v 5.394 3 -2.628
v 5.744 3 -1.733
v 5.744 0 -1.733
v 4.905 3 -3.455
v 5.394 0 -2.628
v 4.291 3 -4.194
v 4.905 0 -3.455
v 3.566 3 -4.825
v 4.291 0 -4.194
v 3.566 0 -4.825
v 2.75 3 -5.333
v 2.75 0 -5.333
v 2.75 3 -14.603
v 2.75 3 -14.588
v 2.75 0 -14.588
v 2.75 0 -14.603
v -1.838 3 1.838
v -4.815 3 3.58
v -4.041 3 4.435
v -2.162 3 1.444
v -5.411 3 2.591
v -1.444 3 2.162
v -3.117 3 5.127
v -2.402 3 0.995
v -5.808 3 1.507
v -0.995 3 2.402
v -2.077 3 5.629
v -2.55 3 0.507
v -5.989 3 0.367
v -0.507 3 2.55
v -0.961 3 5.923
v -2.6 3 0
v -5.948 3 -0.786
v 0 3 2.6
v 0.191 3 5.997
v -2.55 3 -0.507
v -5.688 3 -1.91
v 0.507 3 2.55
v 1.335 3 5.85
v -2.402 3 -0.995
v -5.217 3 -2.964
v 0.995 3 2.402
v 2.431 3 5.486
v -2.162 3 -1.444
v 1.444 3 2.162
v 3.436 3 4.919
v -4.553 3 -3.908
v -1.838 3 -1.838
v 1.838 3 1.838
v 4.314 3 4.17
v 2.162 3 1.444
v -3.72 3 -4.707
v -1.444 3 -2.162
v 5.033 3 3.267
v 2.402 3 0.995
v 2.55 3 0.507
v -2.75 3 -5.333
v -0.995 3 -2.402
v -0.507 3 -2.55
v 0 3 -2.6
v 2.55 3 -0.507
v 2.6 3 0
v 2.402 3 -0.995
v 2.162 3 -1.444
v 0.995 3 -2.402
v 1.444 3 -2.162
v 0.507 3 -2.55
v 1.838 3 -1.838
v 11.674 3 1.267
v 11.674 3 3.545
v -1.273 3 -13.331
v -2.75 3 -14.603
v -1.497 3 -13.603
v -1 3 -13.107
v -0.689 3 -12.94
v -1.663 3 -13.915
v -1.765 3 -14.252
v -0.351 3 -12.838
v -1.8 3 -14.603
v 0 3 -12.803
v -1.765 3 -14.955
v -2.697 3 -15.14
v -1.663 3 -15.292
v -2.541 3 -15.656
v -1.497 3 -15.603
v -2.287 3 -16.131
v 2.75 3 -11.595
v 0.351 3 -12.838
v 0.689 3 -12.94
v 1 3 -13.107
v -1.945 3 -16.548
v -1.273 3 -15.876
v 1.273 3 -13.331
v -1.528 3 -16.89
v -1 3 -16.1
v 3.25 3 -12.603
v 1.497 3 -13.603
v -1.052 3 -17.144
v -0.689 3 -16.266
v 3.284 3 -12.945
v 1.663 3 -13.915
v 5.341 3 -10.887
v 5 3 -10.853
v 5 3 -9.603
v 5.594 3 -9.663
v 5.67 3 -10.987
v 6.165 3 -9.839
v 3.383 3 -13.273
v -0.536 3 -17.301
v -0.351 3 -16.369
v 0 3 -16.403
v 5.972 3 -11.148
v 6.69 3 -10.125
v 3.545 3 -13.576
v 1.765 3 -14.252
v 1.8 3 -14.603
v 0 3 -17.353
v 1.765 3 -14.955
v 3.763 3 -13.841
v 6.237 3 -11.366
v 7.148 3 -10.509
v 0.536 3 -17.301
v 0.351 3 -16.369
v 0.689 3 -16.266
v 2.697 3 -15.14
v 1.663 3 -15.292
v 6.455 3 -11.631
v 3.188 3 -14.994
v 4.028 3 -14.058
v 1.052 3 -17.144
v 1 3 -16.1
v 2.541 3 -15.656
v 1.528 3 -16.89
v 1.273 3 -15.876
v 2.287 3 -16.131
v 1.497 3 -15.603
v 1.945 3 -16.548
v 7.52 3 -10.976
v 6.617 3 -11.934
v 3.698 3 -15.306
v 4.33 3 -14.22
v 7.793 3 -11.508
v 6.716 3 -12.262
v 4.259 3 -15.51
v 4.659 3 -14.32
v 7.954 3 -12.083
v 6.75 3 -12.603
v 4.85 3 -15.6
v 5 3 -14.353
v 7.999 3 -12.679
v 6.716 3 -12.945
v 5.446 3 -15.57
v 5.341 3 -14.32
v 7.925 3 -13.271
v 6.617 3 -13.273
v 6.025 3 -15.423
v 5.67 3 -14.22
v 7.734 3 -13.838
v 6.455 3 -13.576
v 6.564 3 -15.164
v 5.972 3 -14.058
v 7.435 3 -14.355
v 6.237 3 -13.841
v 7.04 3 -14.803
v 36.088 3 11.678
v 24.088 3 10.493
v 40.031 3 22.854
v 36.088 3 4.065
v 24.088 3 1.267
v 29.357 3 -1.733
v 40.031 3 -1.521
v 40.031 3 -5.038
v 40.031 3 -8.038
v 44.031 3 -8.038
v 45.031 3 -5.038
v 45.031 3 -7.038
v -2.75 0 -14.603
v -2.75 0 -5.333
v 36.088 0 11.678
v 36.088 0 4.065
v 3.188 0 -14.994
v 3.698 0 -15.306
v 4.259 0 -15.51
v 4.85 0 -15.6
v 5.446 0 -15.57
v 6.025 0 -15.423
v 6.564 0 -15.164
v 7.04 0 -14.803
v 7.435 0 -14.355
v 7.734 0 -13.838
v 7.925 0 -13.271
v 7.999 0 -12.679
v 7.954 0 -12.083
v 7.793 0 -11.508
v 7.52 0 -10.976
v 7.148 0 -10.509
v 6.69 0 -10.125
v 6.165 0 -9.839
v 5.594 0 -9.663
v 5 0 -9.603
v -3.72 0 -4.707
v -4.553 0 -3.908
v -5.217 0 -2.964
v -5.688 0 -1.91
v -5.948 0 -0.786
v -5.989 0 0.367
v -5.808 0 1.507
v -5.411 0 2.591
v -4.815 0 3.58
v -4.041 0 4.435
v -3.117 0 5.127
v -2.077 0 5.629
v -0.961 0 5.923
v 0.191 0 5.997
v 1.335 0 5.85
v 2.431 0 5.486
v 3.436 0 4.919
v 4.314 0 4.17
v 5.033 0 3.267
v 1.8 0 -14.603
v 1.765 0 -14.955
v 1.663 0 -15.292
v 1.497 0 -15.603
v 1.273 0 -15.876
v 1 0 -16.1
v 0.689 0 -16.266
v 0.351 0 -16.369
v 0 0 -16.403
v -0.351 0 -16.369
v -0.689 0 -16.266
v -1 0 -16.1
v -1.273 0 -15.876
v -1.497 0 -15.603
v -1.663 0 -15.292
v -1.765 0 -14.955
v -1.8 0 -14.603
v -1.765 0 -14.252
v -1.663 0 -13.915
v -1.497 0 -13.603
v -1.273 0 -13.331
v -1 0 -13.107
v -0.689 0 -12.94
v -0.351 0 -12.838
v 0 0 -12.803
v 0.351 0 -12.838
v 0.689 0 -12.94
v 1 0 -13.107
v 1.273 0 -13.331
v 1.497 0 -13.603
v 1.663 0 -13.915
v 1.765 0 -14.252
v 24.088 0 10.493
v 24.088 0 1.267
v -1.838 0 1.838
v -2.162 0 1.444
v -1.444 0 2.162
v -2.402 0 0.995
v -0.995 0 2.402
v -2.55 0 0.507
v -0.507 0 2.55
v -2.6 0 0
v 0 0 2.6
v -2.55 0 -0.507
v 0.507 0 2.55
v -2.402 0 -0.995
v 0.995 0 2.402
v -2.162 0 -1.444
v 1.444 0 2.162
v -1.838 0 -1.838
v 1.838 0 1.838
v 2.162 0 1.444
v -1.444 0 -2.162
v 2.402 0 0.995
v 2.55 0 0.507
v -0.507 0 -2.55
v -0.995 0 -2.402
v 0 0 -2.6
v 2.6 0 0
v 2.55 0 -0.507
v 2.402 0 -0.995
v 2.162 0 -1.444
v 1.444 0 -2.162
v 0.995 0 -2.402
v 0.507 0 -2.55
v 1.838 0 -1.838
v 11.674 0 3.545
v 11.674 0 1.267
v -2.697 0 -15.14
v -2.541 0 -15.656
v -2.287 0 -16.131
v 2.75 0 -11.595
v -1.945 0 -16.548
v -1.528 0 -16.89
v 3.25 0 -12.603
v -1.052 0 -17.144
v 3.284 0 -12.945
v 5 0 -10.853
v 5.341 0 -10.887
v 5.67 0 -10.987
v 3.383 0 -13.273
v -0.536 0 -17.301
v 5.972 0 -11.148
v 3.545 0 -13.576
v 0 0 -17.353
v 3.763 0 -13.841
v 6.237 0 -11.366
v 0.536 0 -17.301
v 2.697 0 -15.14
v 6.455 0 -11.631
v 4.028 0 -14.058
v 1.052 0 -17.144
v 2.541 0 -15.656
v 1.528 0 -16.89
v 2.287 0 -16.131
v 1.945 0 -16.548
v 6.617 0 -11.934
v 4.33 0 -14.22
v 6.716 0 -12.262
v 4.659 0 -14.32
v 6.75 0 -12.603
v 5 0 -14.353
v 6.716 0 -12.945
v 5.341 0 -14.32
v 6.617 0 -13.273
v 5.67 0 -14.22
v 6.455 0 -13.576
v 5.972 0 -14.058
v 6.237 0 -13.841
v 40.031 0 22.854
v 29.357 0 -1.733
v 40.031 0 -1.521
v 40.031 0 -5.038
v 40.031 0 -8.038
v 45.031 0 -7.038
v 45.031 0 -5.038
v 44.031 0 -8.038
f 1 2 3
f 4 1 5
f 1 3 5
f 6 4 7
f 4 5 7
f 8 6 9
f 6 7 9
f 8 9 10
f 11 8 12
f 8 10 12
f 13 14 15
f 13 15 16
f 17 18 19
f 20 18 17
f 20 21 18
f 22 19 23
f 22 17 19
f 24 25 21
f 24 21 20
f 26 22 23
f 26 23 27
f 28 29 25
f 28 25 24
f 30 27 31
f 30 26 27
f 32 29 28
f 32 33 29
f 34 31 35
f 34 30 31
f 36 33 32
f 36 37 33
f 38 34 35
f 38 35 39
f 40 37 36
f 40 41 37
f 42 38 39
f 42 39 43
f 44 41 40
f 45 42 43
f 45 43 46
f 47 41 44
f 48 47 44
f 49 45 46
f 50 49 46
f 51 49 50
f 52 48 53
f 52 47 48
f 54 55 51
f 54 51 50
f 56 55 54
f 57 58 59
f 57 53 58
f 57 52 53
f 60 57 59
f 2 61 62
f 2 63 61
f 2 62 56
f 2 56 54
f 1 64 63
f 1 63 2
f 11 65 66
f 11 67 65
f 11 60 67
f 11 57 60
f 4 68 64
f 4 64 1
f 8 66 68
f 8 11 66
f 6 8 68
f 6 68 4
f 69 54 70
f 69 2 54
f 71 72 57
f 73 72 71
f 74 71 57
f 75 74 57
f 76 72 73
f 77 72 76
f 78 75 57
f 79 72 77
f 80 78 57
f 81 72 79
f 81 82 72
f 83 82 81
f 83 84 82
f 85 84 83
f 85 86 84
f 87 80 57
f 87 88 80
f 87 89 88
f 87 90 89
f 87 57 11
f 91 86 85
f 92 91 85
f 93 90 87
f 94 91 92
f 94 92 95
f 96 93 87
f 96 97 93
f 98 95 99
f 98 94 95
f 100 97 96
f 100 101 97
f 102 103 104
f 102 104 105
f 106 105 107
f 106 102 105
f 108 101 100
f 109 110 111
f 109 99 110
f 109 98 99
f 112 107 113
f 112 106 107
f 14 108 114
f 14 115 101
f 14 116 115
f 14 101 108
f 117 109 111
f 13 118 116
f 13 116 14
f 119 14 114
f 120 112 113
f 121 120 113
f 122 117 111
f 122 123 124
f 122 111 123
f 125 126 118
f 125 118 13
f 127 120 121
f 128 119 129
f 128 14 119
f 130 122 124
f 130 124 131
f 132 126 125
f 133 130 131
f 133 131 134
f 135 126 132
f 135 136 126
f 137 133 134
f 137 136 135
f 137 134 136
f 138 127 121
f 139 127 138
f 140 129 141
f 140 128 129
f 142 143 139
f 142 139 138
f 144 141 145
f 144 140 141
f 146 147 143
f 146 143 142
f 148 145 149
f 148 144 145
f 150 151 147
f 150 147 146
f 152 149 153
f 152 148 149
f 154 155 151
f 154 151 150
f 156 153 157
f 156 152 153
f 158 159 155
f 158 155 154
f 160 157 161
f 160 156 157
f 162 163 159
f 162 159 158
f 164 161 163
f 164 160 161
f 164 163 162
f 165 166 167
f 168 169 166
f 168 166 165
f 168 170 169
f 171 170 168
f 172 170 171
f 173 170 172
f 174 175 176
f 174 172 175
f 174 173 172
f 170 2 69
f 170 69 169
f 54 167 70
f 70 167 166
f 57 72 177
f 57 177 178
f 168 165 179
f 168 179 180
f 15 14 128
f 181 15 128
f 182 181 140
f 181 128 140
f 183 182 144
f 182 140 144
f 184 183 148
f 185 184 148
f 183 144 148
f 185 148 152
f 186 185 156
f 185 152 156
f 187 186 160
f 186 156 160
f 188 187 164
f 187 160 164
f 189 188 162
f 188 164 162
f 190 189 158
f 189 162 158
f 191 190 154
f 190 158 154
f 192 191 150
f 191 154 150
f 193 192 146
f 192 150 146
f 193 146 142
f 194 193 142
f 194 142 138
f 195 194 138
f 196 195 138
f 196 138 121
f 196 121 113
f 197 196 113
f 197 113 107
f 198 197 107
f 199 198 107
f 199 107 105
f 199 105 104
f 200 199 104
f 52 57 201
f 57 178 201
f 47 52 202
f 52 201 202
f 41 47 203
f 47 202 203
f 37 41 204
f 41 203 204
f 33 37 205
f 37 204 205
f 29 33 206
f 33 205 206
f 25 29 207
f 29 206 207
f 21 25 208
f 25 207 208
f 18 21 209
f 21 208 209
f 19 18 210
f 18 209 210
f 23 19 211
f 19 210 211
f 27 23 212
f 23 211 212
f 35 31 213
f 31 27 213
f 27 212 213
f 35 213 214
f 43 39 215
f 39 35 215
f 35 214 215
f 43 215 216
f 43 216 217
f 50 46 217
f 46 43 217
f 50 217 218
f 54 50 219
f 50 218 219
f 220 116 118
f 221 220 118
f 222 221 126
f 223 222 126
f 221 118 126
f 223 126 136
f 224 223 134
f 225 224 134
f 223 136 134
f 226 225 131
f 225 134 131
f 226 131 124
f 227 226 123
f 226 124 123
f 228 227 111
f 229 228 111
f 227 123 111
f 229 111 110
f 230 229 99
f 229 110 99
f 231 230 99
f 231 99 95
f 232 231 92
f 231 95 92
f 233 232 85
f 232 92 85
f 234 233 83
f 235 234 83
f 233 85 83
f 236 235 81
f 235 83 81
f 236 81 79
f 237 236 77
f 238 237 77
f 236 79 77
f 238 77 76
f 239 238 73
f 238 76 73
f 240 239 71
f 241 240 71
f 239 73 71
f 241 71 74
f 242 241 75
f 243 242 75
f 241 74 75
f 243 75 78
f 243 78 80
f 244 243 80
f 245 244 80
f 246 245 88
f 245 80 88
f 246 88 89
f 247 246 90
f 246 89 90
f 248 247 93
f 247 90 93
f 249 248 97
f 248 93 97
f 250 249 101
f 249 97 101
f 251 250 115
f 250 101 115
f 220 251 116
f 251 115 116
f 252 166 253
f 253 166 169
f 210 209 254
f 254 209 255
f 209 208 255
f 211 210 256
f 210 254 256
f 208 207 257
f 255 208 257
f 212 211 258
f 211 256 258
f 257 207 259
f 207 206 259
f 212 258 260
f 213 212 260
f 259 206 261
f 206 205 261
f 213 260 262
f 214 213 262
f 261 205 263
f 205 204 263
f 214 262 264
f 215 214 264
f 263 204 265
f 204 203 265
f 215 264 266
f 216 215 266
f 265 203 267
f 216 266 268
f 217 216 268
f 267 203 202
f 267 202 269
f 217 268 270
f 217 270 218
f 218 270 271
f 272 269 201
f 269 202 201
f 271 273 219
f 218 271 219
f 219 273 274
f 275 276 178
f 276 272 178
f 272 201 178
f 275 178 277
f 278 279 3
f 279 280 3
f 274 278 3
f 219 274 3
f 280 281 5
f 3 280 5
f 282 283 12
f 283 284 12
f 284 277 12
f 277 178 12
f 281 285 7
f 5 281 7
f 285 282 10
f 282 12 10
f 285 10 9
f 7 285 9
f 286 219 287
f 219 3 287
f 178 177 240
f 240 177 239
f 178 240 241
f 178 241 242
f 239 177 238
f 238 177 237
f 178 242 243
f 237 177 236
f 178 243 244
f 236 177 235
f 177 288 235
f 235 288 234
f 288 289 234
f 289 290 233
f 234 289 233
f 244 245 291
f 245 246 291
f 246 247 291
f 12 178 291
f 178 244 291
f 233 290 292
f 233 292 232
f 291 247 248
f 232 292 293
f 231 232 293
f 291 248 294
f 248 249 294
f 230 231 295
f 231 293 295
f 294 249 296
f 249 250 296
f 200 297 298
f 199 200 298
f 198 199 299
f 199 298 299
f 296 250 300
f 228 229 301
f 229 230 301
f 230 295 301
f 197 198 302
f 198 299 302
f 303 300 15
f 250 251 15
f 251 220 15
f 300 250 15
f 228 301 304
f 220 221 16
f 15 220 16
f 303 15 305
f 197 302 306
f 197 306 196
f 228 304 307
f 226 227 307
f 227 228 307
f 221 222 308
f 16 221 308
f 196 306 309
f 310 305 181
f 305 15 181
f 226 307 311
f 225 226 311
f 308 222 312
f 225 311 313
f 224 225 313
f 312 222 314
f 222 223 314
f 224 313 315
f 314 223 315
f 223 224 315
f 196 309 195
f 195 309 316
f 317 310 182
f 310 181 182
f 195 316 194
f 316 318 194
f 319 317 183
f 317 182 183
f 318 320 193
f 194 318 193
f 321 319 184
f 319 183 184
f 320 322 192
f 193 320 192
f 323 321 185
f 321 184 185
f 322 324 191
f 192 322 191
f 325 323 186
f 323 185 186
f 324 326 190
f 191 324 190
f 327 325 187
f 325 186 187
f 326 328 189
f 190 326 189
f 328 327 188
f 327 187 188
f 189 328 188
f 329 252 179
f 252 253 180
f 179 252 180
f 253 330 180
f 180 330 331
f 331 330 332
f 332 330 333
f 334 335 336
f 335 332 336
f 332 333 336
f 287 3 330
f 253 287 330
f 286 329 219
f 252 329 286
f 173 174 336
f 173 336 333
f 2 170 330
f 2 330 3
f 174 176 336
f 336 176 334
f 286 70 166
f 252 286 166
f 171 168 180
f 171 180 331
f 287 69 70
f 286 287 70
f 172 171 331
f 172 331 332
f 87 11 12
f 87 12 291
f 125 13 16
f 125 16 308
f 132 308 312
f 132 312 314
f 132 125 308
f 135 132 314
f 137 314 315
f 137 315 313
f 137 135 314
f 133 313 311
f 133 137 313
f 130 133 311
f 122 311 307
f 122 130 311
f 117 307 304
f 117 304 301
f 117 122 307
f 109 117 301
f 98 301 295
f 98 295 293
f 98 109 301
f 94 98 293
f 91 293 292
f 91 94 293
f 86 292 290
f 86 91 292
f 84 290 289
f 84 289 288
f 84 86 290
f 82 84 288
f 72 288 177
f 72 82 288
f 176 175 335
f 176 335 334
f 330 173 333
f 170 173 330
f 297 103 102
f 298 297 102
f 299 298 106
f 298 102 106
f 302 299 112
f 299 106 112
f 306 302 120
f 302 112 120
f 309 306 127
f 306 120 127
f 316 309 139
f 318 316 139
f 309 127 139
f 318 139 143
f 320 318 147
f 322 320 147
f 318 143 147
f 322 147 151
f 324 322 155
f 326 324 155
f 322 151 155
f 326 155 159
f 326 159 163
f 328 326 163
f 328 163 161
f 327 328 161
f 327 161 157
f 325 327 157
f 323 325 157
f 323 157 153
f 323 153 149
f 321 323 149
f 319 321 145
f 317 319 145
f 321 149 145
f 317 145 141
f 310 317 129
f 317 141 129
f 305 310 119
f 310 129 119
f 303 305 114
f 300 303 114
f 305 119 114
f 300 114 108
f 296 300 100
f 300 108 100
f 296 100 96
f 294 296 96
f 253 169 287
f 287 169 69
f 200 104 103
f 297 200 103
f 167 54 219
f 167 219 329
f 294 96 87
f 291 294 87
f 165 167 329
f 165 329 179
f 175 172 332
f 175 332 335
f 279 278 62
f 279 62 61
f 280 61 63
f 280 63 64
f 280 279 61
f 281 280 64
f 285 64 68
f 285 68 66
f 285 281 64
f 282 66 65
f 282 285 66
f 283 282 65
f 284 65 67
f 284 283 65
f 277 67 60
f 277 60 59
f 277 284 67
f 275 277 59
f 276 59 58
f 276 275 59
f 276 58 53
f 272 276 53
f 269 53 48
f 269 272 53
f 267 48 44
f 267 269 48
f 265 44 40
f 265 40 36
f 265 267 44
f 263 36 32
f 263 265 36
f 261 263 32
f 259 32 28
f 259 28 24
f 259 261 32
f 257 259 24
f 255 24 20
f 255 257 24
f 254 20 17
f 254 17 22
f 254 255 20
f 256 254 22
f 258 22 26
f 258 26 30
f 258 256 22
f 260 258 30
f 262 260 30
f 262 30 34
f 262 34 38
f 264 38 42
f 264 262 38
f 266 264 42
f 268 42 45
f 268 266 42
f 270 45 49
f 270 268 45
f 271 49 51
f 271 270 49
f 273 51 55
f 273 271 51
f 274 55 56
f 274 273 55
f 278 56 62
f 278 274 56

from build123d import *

# Parameters (mm, degrees)
SKETCH_2_R          = 6
SKETCH_2_R_2        = 2.6
EXTRUDE_1_DEPTH     = 3
SKETCH_3_R          = 1.8
EXTRUDE_2_DEPTH     = 3
EXTRUDE_3_DEPTH     = 3
EXTRUDE_4_DEPTH     = 3
CHAMFER_2_SIZE      = 1
CUT_EXTRUDE_1_DEPTH = 5


with BuildPart() as part:
    # 草图2 → 凸台-拉伸1 (new body)
    with BuildSketch(Plane(origin=(0, 0, 0), x_dir=(1, 0, 0), z_dir=(0, 1, 0))):
        Circle(SKETCH_2_R)
        Circle(SKETCH_2_R_2, mode=Mode.SUBTRACT)
    extrude(amount=EXTRUDE_1_DEPTH)

    # 草图3 → 凸台-拉伸2 (add)
    with BuildSketch(Plane(origin=(0, 3, 0), x_dir=(1, 0, 0), z_dir=(0, 1, 0))):
        with BuildLine():
            Line((-2.75, 14.603353962), (-2.75, 5.332682252))
            Line((-2.75, 5.332682252), (2.75, 5.332682252))
            Line((2.75, 5.332682252), (2.75, 14.603353962))
            ThreePointArc((2.75, 14.603353962), (0, 17.353353962), (-2.75, 14.603353962))
        make_face()
        with Locations((0, 14.603353962)):
            Circle(SKETCH_3_R, mode=Mode.SUBTRACT)
    extrude(amount=-EXTRUDE_2_DEPTH)

    # 草图5 → 凸台-拉伸3 (add)
    with BuildSketch(Plane(origin=(0, 3, 0), x_dir=(1, 0, 0), z_dir=(0, 1, 0))):
        with BuildLine():
            Line((3.25, 12.603353962), (2.458972536, 11.008619055))
            ThreePointArc((2.458972536, 11.008619055), (6.451860062, 15.228635349), (5, 9.603353962))
            Line((5, 9.603353962), (5, 10.853353962))
            ThreePointArc((5, 10.853353962), (6.237436867, 13.840790829), (3.25, 12.603353962))
        make_face()
    extrude(amount=-EXTRUDE_3_DEPTH)

    # 草图6 → 凸台-拉伸4 (add)
    with BuildSketch(Plane(origin=(0, 3, 0), x_dir=(1, 0, 0), z_dir=(0, 1, 0))):
        Polygon((5.032823561, -3.266601752), (40.031302406, -22.854160513), (36.087762843, -11.678430785), (36.087762843, -4.064639853), (40.031302406, 1.52127196), (40.031302406, 5.037888577), (45.031302406, 5.037888577), (45.031302406, 8.037888577), (40.031302406, 8.037888577), (29.357105905, 1.733398248), (5.032823561, 1.733398248), align=None)
    extrude(amount=-EXTRUDE_4_DEPTH)

    # 倒角2
    chamfer_2_edges = [part.edges().sort_by_distance(p)[0] for p in [
        (45.031302406, 1.5, -8.037888577),
    ]]
    chamfer(chamfer_2_edges, length=CHAMFER_2_SIZE)

    # 草图7 → 切除-拉伸1 (cut, symmetric)
    with BuildSketch(Plane(origin=(0, 3, 0), x_dir=(1, 0, 0), z_dir=(0, 1, 0))):
        Polygon((11.673818528, -3.545473406), (24.087762843, -10.49317147), (24.087762843, -1.266601752), (11.673818528, -1.266601752), align=None)
    extrude(amount=CUT_EXTRUDE_1_DEPTH, both=True, mode=Mode.SUBTRACT)


solid = part.part
